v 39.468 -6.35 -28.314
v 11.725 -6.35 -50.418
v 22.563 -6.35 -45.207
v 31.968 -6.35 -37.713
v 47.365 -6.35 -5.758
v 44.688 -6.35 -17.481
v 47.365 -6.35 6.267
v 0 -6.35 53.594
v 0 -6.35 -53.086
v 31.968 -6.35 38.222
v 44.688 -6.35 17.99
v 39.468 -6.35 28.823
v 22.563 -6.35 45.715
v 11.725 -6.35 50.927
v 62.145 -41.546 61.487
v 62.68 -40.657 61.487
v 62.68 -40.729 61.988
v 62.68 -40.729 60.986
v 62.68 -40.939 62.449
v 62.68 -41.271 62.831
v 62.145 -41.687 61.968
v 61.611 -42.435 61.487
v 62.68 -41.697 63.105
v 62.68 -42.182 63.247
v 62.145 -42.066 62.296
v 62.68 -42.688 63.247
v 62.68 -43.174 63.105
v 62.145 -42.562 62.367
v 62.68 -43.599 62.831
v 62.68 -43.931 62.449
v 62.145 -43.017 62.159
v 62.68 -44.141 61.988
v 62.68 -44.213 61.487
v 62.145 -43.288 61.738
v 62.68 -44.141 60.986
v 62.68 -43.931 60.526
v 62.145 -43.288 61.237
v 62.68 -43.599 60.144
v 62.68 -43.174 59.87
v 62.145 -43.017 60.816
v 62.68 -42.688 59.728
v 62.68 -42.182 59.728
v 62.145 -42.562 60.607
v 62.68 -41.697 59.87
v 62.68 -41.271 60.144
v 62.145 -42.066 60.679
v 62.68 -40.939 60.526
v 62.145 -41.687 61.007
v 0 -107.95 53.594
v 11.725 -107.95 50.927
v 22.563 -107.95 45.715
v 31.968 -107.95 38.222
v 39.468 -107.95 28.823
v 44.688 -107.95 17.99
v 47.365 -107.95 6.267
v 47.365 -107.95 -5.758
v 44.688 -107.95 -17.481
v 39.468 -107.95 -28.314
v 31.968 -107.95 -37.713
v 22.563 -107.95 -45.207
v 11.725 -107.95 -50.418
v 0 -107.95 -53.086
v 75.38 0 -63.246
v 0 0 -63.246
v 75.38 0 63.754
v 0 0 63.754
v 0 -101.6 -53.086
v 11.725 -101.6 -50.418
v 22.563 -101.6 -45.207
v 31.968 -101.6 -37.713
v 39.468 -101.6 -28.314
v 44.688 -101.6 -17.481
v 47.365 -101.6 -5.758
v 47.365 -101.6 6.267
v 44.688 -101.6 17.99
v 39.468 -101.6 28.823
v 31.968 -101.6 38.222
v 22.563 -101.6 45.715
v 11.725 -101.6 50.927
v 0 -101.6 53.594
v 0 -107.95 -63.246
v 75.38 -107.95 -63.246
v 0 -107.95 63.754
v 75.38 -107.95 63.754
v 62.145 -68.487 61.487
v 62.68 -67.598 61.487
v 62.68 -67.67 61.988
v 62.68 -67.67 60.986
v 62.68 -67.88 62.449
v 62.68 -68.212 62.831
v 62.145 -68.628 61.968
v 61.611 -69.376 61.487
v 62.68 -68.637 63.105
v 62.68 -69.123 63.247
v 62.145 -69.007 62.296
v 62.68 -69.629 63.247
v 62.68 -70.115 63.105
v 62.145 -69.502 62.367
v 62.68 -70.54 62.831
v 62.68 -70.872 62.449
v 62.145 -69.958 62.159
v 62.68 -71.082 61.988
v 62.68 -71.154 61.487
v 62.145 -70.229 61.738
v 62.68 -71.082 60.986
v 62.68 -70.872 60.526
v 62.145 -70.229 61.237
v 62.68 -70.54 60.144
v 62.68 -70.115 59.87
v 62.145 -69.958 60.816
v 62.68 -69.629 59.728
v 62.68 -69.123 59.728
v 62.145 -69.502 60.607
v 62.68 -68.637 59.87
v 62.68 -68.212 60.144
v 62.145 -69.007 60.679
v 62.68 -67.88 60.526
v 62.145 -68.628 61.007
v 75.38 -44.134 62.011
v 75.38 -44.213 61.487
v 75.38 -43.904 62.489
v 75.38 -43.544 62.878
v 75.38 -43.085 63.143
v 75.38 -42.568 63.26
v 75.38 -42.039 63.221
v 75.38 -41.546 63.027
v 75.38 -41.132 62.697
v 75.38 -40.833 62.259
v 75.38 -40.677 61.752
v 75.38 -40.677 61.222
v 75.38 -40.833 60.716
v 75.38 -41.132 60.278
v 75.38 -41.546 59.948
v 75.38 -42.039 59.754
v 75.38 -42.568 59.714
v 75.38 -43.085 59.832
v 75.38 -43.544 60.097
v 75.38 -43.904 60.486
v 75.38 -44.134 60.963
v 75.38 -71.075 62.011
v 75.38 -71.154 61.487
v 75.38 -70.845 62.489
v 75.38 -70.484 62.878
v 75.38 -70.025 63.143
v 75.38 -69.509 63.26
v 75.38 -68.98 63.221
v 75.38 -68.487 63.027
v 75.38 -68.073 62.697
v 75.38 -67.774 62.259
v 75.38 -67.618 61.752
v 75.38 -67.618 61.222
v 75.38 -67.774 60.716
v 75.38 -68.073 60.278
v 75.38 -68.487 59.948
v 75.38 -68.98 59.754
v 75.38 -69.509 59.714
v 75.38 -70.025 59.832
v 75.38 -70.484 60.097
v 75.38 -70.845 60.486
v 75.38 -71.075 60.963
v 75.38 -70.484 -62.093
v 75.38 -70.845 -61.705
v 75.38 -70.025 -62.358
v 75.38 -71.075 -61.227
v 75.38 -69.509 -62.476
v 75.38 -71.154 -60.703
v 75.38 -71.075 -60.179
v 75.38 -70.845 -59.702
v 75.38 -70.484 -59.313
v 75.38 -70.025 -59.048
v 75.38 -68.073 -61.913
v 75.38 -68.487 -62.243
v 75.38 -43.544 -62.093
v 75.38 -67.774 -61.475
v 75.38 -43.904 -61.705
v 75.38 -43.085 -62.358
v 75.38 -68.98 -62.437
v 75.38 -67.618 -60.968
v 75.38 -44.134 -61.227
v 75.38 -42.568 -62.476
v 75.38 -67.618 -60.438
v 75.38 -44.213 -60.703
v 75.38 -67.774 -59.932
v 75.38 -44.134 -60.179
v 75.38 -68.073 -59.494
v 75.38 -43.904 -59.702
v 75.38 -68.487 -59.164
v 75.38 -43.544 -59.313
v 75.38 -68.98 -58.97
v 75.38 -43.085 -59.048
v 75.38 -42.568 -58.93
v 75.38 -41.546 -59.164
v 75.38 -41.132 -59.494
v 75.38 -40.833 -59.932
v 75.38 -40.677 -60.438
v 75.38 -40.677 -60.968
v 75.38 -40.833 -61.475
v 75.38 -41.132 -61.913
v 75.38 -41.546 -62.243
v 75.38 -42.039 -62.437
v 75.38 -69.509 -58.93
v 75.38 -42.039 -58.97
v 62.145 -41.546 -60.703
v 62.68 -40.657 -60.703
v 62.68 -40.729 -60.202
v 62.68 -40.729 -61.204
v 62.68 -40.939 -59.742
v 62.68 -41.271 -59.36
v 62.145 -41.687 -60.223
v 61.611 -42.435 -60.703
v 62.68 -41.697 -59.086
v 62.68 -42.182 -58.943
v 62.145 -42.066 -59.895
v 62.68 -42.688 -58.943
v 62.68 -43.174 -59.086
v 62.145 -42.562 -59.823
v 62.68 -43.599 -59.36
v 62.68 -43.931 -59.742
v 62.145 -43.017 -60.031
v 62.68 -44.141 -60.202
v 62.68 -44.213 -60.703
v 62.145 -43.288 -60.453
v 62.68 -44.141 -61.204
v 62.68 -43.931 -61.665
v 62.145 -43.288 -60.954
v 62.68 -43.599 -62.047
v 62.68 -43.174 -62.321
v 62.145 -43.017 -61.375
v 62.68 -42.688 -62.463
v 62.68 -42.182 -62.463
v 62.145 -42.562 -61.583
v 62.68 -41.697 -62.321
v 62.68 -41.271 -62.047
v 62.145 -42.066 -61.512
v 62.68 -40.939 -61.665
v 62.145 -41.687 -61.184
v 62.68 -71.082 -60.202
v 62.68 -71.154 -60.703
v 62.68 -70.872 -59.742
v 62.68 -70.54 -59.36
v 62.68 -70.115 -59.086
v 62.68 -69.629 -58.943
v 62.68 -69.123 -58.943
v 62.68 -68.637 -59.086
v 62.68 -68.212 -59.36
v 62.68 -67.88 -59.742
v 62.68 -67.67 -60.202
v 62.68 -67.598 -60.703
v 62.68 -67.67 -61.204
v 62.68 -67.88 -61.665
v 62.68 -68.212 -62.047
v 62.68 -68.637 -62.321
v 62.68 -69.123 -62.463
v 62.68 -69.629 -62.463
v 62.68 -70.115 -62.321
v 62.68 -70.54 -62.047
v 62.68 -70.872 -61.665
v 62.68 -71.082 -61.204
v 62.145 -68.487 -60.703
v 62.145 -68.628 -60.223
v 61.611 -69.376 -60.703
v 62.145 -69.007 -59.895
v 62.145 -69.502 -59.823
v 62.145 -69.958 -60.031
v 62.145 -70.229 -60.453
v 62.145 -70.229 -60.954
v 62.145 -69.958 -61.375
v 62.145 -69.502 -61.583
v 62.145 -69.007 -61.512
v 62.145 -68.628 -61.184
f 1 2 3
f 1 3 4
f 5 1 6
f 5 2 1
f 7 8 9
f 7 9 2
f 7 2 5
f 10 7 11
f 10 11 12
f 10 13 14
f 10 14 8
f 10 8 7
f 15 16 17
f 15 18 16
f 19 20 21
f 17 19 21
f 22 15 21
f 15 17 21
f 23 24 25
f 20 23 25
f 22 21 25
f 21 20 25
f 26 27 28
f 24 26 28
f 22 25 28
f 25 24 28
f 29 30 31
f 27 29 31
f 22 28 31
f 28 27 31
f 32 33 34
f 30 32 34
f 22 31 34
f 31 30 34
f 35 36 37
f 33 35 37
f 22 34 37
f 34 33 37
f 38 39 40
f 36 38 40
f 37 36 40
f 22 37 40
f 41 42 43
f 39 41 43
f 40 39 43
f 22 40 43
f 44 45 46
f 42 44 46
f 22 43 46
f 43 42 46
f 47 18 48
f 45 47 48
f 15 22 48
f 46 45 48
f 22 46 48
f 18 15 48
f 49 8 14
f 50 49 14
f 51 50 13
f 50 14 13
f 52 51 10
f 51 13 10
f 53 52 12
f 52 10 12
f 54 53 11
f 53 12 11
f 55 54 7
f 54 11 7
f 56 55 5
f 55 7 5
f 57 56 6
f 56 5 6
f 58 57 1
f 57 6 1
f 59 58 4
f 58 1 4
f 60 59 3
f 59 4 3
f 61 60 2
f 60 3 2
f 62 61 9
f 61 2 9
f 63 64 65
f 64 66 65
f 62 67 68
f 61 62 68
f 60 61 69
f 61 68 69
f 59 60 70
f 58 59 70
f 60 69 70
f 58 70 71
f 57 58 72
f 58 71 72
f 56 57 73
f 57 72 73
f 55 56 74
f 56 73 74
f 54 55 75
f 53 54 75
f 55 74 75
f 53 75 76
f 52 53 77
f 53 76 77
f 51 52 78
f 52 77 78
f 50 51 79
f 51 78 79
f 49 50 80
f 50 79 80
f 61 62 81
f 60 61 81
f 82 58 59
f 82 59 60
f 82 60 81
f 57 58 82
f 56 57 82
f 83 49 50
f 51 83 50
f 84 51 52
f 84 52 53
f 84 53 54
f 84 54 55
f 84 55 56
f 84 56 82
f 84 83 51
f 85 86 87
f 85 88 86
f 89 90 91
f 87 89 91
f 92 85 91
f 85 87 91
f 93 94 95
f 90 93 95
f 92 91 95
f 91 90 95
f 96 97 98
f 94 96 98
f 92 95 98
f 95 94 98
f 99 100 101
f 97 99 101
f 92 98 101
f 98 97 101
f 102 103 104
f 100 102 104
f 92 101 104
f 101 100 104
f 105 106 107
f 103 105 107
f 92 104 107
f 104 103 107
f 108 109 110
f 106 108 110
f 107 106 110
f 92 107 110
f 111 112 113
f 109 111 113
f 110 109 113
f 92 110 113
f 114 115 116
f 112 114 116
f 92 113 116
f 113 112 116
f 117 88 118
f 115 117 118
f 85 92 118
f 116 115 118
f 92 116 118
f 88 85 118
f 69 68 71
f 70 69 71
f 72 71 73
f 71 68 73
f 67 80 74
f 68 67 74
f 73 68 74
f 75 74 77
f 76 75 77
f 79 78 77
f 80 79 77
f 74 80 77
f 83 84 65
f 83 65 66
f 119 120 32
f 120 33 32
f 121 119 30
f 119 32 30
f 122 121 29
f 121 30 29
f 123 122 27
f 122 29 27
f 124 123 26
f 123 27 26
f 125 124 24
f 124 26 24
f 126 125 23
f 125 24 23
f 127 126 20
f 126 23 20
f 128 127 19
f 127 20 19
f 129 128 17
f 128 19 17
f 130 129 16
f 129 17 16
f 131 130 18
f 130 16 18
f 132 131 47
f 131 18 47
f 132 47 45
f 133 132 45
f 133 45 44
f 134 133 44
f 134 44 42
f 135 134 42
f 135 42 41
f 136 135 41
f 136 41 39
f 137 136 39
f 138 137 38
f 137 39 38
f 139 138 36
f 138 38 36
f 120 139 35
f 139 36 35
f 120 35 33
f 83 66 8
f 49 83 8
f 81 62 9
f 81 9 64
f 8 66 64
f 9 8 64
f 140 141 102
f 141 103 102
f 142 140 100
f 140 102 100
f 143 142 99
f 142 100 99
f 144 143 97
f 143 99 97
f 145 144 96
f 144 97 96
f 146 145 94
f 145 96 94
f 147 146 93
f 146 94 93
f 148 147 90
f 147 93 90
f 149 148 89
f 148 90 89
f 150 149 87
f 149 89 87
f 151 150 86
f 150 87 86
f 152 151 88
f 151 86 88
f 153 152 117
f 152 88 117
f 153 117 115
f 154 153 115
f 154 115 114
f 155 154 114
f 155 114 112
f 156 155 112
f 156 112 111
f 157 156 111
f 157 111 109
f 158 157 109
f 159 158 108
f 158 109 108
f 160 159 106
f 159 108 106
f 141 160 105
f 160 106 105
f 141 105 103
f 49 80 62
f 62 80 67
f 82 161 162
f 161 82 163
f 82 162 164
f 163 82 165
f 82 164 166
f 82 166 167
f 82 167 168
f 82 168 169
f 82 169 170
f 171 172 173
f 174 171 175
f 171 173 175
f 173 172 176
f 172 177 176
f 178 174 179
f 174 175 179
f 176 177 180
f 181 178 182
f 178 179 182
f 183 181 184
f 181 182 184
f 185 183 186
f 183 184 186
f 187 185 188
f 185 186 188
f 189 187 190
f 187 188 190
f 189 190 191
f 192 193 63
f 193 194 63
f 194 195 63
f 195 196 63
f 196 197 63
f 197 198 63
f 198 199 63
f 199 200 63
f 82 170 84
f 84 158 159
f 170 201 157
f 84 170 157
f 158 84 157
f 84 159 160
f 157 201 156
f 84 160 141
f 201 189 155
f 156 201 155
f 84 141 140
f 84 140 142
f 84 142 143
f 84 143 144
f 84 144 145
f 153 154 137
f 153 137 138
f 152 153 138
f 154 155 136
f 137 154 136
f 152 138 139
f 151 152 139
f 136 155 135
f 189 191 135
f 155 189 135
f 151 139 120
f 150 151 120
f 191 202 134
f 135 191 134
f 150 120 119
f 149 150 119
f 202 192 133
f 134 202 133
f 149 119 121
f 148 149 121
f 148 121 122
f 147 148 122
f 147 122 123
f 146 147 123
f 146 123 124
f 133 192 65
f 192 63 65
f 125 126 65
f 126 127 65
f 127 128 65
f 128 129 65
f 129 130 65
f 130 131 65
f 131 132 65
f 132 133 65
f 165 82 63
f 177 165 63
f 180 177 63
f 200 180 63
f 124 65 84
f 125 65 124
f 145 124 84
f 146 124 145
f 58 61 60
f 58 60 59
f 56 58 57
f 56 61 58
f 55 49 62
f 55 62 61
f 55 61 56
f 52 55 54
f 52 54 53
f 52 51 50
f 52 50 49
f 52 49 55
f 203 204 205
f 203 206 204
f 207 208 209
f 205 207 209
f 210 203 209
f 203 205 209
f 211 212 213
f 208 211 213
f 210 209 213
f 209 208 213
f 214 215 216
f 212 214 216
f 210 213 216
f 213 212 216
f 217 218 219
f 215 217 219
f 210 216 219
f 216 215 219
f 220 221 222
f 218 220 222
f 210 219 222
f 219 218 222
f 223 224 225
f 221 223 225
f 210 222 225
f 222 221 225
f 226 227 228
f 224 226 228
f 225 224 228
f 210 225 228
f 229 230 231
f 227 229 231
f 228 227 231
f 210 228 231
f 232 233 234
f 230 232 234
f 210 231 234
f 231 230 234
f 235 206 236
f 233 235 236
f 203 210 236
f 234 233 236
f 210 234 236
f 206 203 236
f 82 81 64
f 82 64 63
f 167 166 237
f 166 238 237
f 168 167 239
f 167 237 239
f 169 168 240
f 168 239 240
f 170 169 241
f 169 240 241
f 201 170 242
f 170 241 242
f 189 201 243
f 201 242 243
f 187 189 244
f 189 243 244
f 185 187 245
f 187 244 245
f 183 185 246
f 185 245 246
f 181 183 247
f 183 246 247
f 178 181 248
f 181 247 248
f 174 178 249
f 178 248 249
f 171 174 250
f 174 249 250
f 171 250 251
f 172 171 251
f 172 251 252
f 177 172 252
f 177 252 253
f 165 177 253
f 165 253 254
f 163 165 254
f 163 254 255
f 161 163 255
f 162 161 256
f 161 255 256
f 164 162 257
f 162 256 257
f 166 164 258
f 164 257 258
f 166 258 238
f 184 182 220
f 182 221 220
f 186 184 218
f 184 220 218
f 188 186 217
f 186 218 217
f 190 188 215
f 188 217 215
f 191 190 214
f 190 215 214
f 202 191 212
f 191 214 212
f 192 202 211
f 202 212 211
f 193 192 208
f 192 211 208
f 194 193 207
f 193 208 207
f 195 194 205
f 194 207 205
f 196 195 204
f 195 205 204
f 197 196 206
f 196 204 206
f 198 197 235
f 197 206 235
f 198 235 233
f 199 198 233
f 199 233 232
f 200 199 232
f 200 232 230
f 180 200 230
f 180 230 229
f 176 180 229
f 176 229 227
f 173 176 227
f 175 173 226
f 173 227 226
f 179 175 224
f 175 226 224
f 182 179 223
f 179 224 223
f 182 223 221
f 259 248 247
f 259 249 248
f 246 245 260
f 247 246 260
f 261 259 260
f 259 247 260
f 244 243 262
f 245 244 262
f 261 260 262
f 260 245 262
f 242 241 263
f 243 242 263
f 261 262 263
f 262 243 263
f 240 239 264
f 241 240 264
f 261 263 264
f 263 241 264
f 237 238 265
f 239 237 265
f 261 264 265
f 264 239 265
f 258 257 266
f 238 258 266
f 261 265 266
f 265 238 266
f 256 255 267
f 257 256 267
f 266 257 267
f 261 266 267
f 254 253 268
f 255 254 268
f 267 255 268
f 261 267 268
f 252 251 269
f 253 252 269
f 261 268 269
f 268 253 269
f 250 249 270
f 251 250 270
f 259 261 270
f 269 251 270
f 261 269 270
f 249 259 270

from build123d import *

# Parameters (mm, degrees)
F1_DEPTH = 107.95
F2_DEPTH = 6.35
F3_START = 101.6
F3_DEPTH = 6.35
F5_D     = 3.556
F5_DEPTH = 12.7
F5_TIP   = 1.0683301806


with BuildPart() as f1:
    # F0 (on Front) → F1 (new body)
    with BuildSketch(Plane.XZ):
        with BuildLine():
            ThreePointArc((0, 53.5943763483), (47.7032426175, 0.2543763483), (0, -53.0856236517))
            Line((0, -53.0856236517), (0, -63.2456236517))
            Line((0, -63.2456236517), (75.3796324134, -63.2456236517))
            Line((75.3796324134, -63.2456236517), (75.3796324134, 63.7543763483))
            Line((75.3796324134, 63.7543763483), (0, 63.7543763483))
            Line((0, 63.7543763483), (0, 53.5943763483))
        make_face()
    extrude(amount=F1_DEPTH)

    # F0 (on Front) → F2 (join)
    with BuildSketch(Plane.XZ):
        with BuildLine():
            Line((0, 53.5943763483), (0, -53.0856236517))
            ThreePointArc((0, -53.0856236517), (47.7032426175, 0.2543763483), (0, 53.5943763483))
        make_face()
    extrude(amount=F2_DEPTH)

    # F5
    with Locations(Plane.YZ.offset(75.3796324134)):
        with Locations((-69.3758997451, 61.4874158989), (-42.4351313819, 61.4874158989), (-69.3758997451, -60.7033524643), (-42.4351313819, -60.7033524643)):
            Hole(F5_D / 2, depth=F5_DEPTH)
            with Locations((0, 0, -(F5_DEPTH + F5_TIP / 2))):  # 118° drill point
                Cone(0, F5_D / 2, F5_TIP, mode=Mode.SUBTRACT)


with BuildPart() as f3:
    # F0 (on Front) → F3 (new body)
    with BuildSketch(Plane.XZ.offset(F3_START)):
        with BuildLine():
            Line((0, 53.5943763483), (0, -53.0856236517))
            ThreePointArc((0, -53.0856236517), (47.7032426175, 0.2543763483), (0, 53.5943763483))
        make_face()
    extrude(amount=F3_DEPTH)


solid = Compound([f1.part, f3.part])
